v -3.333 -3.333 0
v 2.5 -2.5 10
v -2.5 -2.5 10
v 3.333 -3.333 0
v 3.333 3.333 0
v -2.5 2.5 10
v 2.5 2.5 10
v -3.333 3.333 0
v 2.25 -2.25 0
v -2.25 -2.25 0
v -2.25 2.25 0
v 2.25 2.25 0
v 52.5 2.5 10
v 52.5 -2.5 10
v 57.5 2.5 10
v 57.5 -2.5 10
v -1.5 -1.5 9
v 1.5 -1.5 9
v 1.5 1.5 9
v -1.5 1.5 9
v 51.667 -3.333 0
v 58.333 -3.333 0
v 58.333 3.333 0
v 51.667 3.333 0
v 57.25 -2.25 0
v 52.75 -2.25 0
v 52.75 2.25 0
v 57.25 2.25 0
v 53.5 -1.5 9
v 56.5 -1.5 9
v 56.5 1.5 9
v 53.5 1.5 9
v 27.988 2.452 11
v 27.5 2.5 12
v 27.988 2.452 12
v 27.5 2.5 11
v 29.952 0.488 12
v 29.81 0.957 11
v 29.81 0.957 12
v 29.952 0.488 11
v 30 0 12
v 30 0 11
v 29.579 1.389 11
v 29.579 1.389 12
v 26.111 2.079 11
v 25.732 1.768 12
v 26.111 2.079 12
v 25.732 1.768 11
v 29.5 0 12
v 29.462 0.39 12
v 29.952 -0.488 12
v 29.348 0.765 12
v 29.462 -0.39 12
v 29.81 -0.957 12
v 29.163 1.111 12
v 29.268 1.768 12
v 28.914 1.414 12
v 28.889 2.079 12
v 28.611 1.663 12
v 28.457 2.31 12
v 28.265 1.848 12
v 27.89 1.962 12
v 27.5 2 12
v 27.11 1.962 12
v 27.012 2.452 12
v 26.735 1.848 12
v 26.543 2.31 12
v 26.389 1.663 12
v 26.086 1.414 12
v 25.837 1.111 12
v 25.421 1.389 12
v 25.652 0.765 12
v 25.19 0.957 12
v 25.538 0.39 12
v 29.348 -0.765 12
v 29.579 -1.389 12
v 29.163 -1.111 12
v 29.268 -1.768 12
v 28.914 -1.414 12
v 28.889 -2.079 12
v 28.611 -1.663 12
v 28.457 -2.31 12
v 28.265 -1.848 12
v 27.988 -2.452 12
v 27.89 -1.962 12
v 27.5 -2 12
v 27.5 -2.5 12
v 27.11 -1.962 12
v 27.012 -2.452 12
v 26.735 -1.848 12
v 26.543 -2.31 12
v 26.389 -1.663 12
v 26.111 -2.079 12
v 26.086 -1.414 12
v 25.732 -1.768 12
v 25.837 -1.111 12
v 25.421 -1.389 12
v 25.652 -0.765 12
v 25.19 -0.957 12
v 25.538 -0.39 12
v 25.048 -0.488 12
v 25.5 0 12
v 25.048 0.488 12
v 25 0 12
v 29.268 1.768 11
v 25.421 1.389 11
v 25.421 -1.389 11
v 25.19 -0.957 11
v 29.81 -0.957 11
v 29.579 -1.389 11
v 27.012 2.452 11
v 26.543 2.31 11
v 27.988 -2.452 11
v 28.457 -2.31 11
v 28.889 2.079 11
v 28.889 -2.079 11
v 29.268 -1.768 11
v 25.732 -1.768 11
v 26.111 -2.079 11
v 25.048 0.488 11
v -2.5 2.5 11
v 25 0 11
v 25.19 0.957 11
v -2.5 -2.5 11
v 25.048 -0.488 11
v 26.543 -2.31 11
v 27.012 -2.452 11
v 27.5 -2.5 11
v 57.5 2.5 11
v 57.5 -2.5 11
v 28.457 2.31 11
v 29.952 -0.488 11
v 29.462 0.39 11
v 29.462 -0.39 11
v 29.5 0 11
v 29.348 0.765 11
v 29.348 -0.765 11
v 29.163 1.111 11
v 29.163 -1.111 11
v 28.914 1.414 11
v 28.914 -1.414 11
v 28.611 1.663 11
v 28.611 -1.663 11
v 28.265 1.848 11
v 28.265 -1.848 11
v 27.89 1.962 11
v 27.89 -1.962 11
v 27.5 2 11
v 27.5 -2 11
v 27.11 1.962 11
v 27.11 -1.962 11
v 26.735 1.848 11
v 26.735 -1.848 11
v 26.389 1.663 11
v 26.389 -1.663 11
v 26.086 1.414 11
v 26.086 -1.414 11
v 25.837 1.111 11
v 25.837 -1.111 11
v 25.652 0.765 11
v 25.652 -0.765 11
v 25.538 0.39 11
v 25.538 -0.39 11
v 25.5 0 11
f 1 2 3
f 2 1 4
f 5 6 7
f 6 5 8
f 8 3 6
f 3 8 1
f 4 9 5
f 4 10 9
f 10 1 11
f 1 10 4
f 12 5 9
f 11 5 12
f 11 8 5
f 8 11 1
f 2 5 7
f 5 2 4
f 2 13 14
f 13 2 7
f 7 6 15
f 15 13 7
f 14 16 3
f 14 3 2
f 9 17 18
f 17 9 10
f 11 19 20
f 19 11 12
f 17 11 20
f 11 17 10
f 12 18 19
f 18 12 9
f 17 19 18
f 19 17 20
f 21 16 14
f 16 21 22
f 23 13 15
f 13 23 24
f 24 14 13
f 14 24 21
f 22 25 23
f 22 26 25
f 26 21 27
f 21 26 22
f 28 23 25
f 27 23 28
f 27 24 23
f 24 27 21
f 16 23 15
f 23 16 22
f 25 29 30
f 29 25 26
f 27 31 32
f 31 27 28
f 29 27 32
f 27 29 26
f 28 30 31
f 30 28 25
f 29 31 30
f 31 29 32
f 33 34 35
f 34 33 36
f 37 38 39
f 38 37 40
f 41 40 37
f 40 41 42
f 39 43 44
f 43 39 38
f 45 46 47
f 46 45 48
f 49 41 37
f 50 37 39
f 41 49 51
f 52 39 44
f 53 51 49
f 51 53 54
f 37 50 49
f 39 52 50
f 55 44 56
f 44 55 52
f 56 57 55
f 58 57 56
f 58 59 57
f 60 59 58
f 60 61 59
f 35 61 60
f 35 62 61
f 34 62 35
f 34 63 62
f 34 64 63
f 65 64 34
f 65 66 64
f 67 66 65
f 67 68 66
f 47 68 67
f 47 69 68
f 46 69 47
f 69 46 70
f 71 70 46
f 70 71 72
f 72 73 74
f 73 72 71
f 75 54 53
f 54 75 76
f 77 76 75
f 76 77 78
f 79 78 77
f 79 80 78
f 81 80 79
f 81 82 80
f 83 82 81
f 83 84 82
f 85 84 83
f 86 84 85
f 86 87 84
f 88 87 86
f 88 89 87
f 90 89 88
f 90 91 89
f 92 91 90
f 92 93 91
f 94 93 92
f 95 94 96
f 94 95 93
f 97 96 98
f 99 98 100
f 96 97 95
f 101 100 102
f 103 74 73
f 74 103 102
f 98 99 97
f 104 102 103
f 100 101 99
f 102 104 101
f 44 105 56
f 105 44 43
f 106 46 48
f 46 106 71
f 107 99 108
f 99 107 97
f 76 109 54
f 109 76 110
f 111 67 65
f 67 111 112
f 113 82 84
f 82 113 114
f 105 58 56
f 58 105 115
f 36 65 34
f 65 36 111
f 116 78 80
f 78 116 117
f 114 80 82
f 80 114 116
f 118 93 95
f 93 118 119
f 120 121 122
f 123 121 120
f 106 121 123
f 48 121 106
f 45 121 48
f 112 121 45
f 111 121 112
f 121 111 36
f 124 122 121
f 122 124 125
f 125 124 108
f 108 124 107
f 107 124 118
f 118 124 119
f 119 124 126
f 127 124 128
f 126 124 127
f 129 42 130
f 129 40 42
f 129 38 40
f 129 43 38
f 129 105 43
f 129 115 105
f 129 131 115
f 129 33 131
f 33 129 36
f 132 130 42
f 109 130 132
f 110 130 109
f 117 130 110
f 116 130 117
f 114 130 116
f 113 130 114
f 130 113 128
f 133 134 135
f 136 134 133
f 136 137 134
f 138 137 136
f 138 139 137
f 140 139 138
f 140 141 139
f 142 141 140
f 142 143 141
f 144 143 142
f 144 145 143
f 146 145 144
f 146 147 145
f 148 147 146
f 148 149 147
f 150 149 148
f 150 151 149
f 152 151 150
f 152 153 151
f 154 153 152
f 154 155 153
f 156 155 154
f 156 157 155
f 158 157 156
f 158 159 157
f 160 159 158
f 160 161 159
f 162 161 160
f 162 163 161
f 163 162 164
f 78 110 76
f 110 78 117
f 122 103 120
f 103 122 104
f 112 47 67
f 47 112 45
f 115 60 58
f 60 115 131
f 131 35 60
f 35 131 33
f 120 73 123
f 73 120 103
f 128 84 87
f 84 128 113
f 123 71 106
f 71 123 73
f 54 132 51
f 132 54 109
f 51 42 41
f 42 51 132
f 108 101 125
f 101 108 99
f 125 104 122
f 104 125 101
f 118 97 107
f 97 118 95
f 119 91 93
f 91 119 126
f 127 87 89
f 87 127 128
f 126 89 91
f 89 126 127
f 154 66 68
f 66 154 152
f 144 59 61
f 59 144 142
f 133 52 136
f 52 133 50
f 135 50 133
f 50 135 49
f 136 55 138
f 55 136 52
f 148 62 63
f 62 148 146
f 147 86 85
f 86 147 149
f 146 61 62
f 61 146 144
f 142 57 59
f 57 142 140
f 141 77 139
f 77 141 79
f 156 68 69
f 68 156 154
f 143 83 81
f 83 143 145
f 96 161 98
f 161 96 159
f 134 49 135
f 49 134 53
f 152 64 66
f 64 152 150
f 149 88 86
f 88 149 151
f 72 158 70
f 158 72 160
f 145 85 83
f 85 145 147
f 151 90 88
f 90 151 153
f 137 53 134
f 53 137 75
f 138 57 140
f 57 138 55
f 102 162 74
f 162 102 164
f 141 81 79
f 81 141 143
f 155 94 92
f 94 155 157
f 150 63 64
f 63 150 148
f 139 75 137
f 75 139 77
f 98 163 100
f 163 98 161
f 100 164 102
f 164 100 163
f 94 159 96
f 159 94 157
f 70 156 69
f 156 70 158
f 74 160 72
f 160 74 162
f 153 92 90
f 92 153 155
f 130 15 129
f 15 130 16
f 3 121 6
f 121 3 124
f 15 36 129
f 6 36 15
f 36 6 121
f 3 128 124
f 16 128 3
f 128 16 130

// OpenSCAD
bridge_length = 50;
bridge_angle = 0;
bridge_width = 5;

bridge_recovery_layers = 10;

layer_height = 0.1;
extrusion_width = 0.5;

module foot() {
	rotate([0, 0, 180/4]) cylinder(r=bridge_width * 2, h=layer_height, $fn=4);
}

module strut() {
	rotate([0, 0, 180/4])
	difference() {
		cylinder(r1=bridge_width / 1.5 / cos(45), r2=bridge_width / 2 / cos(45), h=10, $fn=4);
		translate([0, 0, -1]) cylinder(r1=(bridge_width / 1.5 - extrusion_width * 2) / cos(45), r2=(bridge_width / 2 - extrusion_width * 2) / cos(45), h=10, $fn=4);
	}
}

rotate(bridge_angle) {
	%translate([00, 0, 0]) foot();
	%translate([bridge_length + bridge_width, 0, 0]) foot();

	translate([00, 0, 0]) strut();
	translate([bridge_length + bridge_width, 0, 0]) strut();

	translate([bridge_width / -2, bridge_width / -2, 10]) cube([bridge_length + bridge_width * 2, bridge_width, layer_height * bridge_recovery_layers]);

	translate([bridge_length / 2 + bridge_width / 2, 0, 10 + layer_height * bridge_recovery_layers])
	difference() {
		cylinder(r=bridge_width / 2, h=1, $fn=32);
		cylinder(r=bridge_width / 2 - extrusion_width, h=1.01, $fn=32);
	}
}
